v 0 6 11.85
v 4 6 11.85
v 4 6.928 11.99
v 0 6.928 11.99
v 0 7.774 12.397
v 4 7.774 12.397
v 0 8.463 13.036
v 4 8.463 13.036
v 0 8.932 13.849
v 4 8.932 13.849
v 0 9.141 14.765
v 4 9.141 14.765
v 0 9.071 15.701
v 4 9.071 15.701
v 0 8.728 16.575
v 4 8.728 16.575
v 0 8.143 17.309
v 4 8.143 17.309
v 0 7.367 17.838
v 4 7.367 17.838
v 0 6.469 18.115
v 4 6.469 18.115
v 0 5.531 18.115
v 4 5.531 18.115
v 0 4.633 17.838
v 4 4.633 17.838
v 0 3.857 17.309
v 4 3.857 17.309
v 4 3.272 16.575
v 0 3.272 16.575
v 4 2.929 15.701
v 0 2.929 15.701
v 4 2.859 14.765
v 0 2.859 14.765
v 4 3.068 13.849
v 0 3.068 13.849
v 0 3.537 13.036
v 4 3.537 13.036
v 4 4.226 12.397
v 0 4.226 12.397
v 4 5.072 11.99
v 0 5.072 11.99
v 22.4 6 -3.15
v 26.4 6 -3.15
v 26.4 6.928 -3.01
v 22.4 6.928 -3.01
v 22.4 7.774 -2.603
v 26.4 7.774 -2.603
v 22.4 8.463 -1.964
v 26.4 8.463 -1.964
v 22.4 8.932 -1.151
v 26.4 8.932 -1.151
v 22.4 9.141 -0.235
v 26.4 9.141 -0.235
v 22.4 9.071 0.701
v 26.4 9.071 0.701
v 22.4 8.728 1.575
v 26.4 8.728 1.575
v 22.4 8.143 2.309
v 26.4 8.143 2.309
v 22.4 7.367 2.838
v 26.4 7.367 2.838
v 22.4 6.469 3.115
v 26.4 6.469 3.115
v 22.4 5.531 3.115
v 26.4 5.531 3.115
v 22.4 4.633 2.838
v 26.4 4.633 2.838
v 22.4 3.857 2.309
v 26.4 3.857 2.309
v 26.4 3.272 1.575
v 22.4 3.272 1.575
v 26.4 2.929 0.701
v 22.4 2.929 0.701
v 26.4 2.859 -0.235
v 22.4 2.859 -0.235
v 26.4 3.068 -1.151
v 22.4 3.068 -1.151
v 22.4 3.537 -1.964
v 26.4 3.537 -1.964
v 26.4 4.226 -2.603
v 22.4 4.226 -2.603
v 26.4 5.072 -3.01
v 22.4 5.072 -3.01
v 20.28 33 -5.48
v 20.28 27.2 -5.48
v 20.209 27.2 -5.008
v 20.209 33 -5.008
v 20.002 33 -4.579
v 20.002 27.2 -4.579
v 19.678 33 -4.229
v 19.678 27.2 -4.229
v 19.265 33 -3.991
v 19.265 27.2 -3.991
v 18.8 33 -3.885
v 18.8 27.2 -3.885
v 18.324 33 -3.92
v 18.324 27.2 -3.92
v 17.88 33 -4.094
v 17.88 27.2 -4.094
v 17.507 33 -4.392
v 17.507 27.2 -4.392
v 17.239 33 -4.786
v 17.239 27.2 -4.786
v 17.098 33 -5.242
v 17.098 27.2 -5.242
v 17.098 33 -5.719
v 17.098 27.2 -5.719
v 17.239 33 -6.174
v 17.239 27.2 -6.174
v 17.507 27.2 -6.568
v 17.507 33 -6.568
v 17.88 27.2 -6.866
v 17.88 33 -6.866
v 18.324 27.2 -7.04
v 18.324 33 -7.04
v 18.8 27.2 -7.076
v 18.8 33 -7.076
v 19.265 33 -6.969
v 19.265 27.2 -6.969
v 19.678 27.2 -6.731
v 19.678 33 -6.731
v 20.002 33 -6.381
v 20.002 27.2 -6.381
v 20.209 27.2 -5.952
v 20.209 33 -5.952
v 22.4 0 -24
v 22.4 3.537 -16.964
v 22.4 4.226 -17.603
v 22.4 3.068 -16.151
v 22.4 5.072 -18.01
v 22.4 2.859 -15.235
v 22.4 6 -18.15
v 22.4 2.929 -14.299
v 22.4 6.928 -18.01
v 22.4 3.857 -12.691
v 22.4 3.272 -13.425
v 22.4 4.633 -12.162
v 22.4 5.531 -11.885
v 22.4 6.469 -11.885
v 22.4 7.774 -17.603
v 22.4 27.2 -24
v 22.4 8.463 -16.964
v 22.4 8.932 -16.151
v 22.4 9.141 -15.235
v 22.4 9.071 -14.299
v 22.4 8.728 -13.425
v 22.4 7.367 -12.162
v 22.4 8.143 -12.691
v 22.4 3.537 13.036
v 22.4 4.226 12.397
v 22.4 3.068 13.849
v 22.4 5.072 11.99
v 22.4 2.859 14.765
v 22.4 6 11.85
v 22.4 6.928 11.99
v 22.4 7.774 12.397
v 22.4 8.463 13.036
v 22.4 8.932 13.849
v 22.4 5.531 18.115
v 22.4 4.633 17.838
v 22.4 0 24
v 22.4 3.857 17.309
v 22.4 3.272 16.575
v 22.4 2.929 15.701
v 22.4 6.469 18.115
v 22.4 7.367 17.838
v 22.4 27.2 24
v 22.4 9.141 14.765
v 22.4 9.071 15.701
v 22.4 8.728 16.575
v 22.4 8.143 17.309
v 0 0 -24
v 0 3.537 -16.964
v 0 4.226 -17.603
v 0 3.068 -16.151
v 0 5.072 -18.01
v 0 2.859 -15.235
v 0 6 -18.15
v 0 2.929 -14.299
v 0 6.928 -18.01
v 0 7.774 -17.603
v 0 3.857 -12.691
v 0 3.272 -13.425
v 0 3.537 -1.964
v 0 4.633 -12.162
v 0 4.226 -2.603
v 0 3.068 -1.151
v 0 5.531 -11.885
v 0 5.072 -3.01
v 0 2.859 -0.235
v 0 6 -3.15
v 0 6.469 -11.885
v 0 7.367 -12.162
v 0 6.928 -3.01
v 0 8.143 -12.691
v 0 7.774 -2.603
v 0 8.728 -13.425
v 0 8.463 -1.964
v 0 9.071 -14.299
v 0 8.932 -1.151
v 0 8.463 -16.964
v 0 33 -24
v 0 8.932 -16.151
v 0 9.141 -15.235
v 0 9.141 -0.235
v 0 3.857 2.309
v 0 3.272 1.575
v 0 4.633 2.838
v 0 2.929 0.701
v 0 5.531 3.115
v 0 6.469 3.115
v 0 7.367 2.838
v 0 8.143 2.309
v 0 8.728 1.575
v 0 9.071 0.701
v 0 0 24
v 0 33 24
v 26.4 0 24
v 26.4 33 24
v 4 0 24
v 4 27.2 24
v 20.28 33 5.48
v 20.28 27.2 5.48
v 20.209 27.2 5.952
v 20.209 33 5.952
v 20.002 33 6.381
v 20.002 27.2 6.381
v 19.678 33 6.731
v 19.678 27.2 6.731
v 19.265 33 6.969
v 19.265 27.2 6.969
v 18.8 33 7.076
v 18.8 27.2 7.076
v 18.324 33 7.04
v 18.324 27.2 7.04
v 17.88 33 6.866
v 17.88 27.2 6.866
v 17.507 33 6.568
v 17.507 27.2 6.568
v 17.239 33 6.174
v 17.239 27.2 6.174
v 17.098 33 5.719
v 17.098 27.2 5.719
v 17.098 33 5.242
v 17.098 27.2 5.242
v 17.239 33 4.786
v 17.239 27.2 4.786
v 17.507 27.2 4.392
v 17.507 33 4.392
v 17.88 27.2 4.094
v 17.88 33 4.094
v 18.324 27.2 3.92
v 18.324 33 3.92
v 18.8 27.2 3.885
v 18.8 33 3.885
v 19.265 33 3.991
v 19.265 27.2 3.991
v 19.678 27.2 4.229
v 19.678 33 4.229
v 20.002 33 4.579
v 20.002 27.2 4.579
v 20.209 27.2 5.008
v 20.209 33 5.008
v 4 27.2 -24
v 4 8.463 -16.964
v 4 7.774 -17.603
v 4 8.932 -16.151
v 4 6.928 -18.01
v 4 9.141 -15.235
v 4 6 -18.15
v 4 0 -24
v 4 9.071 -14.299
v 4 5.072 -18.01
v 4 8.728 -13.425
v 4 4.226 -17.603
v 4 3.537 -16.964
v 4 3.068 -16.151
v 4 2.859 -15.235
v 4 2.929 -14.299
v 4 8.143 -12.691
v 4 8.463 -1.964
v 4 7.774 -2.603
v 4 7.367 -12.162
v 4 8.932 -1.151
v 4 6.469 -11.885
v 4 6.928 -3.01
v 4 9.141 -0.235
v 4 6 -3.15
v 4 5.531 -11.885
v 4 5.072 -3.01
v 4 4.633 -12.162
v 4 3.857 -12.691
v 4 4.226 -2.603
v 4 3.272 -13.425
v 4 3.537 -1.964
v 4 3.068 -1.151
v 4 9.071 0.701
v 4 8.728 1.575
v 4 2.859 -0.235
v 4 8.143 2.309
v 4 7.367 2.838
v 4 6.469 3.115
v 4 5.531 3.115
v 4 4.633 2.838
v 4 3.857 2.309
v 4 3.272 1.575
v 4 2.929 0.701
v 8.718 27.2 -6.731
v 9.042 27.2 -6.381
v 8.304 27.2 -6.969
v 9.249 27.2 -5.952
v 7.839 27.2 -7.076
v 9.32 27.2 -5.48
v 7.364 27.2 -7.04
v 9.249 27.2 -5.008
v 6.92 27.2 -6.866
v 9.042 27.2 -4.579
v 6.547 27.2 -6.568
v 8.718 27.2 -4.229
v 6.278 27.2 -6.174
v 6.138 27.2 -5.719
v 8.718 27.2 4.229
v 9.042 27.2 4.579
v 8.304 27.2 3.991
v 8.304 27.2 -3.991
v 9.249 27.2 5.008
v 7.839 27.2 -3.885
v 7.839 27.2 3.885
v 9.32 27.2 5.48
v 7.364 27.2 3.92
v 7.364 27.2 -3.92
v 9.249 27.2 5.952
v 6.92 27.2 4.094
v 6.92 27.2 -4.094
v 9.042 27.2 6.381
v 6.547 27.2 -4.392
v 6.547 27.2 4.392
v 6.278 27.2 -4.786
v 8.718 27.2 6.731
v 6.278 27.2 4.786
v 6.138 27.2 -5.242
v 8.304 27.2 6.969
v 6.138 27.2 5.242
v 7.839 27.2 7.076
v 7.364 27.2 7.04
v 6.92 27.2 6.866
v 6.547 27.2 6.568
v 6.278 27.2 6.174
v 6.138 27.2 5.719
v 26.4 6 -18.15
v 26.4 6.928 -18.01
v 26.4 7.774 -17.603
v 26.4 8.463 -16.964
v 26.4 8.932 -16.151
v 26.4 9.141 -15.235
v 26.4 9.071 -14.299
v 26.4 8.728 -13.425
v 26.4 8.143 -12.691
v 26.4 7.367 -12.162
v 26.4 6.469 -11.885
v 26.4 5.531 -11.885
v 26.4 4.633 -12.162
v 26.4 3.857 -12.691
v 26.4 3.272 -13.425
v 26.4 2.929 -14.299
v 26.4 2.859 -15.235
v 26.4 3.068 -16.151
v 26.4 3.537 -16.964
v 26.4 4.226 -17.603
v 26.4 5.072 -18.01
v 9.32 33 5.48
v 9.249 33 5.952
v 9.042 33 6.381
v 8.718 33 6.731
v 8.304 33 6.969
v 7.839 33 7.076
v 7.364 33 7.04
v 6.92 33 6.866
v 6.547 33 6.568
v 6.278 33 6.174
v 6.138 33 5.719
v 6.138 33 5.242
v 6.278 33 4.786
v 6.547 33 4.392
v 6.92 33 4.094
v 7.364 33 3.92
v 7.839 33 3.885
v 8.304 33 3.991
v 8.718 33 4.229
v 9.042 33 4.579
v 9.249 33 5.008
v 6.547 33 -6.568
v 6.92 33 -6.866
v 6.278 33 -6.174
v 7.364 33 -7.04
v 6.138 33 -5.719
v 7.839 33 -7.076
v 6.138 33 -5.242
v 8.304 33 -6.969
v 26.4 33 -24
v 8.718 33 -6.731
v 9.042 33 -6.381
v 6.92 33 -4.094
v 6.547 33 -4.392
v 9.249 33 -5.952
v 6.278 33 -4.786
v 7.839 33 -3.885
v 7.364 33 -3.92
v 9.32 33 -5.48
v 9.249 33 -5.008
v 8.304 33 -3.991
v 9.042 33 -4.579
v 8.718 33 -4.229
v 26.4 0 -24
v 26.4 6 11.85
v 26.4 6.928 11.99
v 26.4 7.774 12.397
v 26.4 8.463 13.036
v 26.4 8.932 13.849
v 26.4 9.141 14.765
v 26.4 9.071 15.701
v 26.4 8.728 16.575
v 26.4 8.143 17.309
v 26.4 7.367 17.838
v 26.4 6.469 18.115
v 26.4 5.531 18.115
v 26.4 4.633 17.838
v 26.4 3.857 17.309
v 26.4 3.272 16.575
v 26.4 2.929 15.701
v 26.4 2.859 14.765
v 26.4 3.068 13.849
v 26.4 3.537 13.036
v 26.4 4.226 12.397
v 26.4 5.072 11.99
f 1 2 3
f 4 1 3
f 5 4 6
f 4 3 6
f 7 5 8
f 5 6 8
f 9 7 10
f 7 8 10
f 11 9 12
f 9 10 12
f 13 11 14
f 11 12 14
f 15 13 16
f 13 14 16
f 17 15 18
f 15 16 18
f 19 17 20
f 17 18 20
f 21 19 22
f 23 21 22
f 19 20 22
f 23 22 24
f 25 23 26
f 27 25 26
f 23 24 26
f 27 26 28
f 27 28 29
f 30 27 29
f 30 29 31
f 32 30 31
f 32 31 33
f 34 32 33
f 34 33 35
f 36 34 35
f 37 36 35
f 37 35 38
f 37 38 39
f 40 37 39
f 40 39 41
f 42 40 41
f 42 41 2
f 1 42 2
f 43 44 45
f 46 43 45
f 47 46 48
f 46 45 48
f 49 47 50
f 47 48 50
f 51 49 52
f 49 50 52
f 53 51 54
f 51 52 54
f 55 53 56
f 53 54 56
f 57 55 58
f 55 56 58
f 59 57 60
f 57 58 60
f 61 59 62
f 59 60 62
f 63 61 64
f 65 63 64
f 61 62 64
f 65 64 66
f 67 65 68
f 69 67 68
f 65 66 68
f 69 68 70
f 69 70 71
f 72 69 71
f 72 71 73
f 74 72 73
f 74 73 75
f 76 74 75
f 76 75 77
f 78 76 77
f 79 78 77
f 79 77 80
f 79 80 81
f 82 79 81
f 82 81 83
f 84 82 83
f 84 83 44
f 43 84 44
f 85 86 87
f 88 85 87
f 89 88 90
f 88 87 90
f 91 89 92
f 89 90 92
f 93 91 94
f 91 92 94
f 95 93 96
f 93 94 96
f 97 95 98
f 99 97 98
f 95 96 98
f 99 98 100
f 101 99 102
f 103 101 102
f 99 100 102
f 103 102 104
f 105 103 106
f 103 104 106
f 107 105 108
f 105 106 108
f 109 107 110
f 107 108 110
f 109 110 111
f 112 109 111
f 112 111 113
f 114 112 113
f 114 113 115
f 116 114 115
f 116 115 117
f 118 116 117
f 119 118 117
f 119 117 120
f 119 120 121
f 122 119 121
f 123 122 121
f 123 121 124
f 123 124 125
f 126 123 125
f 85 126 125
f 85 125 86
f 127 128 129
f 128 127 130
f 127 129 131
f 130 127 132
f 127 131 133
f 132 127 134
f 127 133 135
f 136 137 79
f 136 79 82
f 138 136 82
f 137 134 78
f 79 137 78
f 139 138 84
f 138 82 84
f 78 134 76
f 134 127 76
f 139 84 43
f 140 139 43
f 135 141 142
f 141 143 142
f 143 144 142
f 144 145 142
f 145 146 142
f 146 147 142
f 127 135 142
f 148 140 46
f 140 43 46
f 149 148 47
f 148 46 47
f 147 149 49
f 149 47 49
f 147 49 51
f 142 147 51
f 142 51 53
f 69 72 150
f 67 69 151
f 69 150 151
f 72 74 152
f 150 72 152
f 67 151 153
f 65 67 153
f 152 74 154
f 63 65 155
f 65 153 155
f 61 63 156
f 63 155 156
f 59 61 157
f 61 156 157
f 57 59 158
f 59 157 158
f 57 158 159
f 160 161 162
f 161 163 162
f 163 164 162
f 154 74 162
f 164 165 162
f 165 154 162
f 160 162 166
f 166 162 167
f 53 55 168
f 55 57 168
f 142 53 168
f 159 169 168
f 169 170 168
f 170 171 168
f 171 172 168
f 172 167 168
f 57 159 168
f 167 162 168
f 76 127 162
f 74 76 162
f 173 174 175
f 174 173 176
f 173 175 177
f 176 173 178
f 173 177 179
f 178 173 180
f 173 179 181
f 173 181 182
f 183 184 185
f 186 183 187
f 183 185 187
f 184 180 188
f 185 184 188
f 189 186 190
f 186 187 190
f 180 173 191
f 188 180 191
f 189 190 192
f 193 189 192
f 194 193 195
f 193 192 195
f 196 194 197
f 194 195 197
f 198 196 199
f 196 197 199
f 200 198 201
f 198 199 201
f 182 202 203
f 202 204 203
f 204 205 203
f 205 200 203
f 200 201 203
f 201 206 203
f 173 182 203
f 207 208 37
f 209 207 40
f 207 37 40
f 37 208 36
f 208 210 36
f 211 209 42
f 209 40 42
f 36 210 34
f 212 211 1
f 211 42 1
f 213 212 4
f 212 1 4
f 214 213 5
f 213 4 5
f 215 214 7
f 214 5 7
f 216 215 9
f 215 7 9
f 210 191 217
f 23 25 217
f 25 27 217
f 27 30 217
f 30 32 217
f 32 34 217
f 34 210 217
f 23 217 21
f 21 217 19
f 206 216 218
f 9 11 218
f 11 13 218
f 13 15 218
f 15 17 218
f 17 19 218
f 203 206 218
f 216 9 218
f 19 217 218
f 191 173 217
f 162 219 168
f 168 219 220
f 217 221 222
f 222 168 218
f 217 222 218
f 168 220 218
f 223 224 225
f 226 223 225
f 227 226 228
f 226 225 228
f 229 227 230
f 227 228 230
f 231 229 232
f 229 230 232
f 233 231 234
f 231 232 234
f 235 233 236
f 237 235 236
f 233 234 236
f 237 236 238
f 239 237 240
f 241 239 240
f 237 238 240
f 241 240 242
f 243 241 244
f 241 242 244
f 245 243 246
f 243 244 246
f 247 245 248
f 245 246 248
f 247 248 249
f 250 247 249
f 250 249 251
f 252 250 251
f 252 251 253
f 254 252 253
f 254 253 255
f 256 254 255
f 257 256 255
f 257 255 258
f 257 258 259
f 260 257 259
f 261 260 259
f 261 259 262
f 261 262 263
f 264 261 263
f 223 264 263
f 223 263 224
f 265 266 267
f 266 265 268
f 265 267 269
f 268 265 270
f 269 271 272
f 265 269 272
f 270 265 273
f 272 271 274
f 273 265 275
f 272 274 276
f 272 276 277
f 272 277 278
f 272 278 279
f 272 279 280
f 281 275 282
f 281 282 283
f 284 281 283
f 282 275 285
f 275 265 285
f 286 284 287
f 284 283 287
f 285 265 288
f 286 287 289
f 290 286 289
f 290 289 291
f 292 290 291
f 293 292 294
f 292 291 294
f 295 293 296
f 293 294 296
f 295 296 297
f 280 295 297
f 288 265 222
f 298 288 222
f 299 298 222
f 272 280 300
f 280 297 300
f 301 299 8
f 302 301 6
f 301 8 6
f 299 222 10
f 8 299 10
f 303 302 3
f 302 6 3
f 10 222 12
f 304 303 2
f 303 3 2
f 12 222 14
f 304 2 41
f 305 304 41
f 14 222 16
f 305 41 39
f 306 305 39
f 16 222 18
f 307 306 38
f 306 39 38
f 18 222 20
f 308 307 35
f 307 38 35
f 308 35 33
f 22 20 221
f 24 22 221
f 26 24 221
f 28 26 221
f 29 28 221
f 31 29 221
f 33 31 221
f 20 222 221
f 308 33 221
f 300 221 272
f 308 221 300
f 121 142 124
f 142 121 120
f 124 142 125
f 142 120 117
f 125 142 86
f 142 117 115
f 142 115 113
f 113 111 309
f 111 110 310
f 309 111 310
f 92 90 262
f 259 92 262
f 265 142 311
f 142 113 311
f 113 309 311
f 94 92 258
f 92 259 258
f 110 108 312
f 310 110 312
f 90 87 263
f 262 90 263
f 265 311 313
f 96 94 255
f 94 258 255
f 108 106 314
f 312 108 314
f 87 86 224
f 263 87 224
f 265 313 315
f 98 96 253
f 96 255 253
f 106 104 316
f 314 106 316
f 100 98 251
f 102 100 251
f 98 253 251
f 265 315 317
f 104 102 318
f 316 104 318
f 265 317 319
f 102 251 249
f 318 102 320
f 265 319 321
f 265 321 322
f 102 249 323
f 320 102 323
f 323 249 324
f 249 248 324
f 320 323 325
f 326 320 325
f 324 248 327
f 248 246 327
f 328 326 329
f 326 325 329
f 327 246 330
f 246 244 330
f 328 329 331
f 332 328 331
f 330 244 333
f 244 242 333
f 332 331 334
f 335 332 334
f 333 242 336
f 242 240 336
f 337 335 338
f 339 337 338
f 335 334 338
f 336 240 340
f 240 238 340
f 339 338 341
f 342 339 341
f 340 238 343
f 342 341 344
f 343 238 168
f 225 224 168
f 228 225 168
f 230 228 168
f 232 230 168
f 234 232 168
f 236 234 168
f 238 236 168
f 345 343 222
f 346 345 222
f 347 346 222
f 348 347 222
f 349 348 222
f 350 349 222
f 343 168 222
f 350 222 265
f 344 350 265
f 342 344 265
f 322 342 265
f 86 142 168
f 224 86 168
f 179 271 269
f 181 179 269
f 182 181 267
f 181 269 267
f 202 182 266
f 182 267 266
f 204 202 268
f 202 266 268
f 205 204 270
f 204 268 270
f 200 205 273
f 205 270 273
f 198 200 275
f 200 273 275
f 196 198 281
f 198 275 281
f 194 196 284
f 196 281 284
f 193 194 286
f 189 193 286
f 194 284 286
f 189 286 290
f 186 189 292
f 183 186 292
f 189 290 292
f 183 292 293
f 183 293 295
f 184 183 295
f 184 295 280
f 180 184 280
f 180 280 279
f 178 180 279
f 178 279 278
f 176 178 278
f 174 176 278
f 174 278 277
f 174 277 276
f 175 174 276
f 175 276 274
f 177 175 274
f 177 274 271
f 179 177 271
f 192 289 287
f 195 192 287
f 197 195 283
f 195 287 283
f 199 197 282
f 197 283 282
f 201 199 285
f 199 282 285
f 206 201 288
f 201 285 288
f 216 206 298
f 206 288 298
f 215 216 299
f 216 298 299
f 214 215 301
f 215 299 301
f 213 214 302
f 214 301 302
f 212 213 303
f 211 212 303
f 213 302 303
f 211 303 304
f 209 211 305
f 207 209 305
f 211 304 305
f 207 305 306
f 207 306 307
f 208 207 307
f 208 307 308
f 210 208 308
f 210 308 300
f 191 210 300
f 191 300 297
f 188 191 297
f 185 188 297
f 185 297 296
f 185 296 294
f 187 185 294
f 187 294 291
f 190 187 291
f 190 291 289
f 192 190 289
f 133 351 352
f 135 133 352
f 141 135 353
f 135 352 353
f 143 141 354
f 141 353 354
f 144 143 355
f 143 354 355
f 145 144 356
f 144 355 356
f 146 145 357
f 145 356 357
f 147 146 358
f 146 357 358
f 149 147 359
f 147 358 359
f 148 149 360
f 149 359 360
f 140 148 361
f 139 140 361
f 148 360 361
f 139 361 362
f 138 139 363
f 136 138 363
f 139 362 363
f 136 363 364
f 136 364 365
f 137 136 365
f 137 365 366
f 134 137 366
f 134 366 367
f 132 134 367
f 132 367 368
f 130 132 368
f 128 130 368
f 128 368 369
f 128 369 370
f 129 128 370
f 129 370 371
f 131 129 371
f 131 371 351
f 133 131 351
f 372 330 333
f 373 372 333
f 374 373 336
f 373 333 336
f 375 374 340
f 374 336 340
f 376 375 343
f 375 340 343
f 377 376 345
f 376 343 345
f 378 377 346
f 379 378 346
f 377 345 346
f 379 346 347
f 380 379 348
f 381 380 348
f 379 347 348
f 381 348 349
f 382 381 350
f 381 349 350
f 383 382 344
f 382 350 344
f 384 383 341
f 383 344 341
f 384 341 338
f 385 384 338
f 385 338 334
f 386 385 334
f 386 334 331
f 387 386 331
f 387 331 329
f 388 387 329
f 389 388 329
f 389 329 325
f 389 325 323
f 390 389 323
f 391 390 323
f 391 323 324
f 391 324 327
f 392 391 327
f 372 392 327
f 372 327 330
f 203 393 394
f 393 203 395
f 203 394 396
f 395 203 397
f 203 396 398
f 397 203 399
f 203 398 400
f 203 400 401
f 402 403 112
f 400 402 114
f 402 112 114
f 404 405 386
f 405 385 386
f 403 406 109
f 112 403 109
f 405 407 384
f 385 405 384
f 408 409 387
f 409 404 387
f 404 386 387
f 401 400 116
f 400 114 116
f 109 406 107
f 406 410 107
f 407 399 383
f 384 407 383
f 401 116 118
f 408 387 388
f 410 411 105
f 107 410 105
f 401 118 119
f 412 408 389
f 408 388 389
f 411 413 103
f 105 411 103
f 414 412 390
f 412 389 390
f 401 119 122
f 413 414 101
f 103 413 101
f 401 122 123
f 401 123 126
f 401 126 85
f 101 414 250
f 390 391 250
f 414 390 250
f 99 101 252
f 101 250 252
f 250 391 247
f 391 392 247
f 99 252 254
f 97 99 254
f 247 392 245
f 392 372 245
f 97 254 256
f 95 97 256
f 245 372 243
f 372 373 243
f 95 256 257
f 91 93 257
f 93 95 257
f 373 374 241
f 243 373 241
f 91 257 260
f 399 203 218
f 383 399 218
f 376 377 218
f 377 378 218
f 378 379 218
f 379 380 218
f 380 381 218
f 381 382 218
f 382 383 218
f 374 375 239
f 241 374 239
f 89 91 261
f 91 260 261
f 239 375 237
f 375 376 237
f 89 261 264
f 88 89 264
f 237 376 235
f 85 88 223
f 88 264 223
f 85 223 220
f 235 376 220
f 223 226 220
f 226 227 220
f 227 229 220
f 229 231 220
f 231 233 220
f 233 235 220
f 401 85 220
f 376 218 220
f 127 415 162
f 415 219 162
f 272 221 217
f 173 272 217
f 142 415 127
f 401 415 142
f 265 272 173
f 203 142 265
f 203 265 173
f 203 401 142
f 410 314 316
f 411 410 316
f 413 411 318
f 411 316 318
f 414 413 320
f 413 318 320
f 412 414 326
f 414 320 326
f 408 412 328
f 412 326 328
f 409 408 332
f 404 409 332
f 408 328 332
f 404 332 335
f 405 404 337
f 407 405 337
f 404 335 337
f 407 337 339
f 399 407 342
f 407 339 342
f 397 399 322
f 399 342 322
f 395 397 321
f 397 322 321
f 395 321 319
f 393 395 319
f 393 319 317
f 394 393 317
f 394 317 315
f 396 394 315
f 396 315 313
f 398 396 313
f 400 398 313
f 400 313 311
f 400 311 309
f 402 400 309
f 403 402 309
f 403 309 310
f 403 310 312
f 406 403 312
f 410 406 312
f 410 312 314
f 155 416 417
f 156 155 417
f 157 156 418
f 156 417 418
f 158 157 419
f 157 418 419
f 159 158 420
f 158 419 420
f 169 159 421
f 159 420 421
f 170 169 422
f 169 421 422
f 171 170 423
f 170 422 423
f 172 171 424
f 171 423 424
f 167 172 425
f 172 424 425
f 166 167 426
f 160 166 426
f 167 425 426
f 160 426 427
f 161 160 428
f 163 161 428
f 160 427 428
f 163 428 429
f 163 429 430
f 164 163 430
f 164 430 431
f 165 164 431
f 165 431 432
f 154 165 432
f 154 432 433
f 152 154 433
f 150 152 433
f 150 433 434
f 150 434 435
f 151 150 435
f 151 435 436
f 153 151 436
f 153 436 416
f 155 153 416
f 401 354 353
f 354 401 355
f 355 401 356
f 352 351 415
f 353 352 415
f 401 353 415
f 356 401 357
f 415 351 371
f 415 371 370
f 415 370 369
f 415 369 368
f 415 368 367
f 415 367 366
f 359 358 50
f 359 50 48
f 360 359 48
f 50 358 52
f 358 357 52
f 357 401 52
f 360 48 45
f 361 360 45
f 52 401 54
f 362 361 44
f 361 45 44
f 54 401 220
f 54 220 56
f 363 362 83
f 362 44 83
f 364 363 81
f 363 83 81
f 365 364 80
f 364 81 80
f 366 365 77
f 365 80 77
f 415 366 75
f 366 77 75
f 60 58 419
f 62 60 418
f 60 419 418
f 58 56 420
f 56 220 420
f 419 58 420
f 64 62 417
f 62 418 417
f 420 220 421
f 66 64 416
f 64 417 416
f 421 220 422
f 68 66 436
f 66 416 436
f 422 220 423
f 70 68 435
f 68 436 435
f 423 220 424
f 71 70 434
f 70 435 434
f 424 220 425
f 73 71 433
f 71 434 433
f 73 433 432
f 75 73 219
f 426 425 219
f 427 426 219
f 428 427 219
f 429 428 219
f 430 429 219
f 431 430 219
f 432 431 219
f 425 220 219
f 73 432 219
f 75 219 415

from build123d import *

# Parameters (mm, degrees)
EXTRUDE_1_DEPTH     = 24
SKETCH_2_R          = 1.6
CUT_EXTRUDE_1_DEPTH = 6.8
SKETCH_3_R          = 3.15
CUT_EXTRUDE_2_DEPTH = 26.4


with BuildPart() as part:
    # 草圖1 → 填料-伸長1 (new body, symmetric)
    with BuildSketch(Plane.XY):
        Polygon((0, 0), (0, 33), (26.4, 33), (26.4, 0), (22.4, 0), (22.4, 27.2), (4, 27.2), (4, 0), align=None)
    extrude(amount=EXTRUDE_1_DEPTH, both=True)

    # 草圖2 → 除料-伸長1 (cut, through all)
    with BuildSketch(Plane.XZ.offset(-27.2)):
        with Locations((7.719922446, 5.480077554)):
            Circle(SKETCH_2_R)
        with Locations((18.680077554, 5.480077554)):
            Circle(SKETCH_2_R)
        with Locations((18.680077554, -5.480077554)):
            Circle(SKETCH_2_R)
        with Locations((7.719922446, -5.480077554)):
            Circle(SKETCH_2_R)
    extrude(amount=-CUT_EXTRUDE_1_DEPTH, mode=Mode.SUBTRACT)

    # 草圖3 → 除料-伸長2 (cut)
    with BuildSketch(Plane(origin=(26.4, 0, 0), x_dir=(0, 0, -1), z_dir=(1, 0, 0))):
        with Locations((0, 6)):
            Circle(SKETCH_3_R)
        with Locations((15, 6)):
            Circle(SKETCH_3_R)
        with Locations((-15, 6)):
            Circle(SKETCH_3_R)
    extrude(amount=-CUT_EXTRUDE_2_DEPTH, mode=Mode.SUBTRACT)


solid = part.part
